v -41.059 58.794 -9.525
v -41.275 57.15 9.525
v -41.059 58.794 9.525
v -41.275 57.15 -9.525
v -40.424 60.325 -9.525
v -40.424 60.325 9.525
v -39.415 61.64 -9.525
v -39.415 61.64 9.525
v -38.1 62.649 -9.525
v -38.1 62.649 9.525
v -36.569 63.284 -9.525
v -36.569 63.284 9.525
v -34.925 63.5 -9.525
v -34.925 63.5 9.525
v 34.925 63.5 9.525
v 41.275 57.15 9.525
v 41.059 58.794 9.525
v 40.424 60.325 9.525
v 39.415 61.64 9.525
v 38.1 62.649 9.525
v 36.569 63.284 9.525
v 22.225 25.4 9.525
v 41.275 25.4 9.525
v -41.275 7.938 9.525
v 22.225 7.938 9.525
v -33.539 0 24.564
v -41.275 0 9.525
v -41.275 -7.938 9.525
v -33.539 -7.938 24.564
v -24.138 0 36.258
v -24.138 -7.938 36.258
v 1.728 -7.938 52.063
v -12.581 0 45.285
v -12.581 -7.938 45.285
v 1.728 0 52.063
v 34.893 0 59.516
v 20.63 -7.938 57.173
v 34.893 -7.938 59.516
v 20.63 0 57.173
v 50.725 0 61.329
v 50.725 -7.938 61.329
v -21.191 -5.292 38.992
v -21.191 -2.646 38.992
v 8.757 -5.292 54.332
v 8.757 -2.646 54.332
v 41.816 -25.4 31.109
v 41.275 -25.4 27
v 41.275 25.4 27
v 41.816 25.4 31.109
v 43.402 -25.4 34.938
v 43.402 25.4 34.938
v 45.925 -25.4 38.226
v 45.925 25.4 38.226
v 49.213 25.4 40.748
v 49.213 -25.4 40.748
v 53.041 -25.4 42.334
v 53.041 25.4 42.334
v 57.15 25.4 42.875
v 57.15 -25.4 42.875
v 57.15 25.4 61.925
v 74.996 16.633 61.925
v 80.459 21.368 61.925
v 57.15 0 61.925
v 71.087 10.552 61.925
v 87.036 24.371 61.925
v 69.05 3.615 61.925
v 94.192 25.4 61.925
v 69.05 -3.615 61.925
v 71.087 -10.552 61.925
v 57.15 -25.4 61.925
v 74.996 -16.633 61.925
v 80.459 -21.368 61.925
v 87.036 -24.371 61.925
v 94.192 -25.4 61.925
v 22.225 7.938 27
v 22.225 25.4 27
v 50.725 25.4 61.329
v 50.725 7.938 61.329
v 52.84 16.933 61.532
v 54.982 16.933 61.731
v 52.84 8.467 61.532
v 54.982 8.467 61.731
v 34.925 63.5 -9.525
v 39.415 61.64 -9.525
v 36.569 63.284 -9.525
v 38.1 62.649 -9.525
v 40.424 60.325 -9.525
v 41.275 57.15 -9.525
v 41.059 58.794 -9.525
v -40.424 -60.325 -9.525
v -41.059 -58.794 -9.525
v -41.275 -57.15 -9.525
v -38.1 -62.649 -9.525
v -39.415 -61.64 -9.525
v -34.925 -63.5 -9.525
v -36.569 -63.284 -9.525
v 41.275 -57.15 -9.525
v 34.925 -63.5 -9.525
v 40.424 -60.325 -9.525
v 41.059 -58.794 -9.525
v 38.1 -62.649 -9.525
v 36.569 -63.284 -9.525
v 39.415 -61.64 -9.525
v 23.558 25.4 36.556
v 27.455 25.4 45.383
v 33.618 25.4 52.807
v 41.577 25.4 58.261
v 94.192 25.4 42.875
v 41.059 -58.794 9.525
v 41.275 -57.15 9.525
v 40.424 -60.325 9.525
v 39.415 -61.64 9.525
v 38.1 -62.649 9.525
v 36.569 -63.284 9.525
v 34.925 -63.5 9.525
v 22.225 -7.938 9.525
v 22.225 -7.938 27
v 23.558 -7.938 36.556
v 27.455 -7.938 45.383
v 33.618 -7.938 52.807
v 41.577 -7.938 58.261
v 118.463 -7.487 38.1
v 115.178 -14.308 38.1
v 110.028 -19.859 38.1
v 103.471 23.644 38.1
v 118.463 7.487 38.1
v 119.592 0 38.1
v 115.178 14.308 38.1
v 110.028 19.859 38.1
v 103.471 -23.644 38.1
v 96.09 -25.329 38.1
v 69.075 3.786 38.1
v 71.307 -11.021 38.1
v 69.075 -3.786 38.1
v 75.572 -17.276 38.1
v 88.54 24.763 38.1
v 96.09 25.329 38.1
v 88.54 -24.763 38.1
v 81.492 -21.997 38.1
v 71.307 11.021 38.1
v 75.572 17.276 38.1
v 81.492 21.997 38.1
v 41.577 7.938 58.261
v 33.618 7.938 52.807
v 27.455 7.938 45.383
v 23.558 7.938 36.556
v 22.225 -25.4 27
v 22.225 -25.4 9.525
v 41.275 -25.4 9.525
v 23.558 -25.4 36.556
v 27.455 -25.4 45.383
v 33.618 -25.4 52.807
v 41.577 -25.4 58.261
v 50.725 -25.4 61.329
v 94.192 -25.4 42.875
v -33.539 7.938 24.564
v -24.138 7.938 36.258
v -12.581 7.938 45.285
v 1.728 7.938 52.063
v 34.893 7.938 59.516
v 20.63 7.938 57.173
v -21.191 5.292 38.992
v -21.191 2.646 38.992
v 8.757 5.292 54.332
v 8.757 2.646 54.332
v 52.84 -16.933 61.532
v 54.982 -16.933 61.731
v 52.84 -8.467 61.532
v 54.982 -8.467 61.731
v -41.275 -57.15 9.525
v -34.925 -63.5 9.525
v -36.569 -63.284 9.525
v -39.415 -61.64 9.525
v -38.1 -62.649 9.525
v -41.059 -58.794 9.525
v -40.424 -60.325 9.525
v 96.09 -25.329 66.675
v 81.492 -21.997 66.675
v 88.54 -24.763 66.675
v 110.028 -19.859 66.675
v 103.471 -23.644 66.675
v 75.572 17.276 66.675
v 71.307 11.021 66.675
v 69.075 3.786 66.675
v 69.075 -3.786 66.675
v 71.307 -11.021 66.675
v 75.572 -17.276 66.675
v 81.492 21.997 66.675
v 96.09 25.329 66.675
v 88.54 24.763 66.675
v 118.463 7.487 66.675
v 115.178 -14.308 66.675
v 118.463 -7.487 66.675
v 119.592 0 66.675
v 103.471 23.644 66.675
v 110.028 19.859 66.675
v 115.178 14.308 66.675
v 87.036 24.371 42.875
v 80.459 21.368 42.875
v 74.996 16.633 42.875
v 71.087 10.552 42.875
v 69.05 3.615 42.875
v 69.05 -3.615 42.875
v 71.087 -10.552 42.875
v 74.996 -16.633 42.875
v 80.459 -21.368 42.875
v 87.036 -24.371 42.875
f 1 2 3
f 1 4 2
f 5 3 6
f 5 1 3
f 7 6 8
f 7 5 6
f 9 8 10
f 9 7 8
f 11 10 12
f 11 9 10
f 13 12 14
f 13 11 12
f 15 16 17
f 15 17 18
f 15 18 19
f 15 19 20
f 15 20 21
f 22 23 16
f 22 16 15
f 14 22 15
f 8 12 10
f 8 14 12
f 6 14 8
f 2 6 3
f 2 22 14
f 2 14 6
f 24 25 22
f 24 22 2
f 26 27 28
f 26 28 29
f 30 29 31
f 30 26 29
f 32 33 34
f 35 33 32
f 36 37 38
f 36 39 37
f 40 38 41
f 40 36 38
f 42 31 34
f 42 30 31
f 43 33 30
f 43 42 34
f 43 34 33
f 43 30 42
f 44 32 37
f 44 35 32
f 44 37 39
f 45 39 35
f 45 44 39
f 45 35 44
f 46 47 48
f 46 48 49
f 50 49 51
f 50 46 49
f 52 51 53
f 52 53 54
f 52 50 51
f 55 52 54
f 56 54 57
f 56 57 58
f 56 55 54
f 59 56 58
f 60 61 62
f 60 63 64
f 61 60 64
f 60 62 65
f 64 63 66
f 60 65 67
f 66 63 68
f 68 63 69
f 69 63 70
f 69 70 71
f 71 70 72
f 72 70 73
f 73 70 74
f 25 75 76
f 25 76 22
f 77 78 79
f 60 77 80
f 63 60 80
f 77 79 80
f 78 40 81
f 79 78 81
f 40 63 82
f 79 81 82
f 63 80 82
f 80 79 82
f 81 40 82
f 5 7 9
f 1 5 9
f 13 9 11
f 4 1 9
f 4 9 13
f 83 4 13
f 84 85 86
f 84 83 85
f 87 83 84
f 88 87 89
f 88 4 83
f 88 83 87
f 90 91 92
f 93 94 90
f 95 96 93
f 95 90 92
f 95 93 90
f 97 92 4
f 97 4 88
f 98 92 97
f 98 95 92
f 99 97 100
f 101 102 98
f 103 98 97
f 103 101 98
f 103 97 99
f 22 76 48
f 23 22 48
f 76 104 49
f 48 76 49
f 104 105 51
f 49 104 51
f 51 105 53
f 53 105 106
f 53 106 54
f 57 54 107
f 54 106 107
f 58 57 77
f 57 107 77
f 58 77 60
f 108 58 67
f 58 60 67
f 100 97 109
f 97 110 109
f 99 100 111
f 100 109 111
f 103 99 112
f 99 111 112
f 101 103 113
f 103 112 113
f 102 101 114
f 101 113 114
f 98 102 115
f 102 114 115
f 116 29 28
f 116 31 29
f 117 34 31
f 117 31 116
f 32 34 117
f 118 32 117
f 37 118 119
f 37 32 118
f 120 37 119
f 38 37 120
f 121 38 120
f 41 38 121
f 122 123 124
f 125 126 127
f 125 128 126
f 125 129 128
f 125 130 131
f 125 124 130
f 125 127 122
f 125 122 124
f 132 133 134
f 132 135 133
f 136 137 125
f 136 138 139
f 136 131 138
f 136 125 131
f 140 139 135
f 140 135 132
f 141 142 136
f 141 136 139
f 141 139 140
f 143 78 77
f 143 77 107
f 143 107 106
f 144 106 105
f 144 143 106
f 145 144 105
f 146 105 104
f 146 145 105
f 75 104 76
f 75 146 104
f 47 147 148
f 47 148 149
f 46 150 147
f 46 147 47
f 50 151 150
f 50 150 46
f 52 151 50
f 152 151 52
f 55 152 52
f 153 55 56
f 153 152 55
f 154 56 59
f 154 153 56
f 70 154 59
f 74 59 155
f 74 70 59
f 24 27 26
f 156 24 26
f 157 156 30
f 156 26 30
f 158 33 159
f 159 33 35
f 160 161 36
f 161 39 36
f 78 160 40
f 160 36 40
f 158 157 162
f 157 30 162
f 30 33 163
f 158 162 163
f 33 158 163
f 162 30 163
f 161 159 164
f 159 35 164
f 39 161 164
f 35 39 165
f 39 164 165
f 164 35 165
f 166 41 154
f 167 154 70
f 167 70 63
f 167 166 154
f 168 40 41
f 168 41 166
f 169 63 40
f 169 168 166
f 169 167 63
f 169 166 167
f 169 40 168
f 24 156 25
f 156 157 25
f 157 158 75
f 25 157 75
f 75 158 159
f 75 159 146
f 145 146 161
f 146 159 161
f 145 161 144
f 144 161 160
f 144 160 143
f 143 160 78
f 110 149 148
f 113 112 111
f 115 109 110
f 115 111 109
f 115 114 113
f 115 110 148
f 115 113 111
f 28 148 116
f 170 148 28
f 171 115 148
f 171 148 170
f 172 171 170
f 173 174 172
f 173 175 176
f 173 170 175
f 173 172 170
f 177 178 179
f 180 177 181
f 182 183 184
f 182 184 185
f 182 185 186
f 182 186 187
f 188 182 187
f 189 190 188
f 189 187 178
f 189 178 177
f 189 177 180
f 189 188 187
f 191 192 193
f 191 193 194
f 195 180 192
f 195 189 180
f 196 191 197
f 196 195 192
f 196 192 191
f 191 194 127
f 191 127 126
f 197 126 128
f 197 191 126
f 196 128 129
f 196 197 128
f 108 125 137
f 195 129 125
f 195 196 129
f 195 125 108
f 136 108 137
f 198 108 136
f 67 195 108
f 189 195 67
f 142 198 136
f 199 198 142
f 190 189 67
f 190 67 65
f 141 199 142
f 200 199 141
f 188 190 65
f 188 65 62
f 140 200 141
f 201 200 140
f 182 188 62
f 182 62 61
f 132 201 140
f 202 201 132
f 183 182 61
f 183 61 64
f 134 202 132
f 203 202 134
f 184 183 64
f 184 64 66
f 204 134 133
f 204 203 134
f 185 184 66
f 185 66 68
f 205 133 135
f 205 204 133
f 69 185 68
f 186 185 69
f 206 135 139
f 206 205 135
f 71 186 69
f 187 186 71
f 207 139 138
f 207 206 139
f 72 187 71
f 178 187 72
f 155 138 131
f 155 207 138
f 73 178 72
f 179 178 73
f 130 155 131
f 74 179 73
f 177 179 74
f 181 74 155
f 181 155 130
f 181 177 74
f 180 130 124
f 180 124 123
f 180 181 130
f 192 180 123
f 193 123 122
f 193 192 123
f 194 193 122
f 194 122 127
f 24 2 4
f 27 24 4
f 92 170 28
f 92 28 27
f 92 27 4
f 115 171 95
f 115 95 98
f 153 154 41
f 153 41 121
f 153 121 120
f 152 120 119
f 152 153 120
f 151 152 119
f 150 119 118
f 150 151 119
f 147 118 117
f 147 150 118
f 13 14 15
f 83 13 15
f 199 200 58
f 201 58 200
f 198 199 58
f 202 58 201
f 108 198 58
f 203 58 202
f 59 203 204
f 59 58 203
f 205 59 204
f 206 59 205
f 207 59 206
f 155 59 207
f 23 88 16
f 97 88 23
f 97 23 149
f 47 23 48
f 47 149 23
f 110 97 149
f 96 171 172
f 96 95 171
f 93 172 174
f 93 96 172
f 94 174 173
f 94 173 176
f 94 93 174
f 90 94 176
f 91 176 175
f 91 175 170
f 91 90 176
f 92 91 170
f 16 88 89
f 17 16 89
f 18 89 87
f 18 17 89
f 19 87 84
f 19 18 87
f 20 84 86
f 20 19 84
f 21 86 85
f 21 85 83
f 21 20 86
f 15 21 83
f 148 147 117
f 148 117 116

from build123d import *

# Parameters (mm, degrees)
F1_DEPTH = 63.5
F2_DEPTH = 25.4
F3_DEPTH = 7.9375
F0_W     = 25.4
F0_H     = 19.05
F4_DEPTH = 25.4
F6_R     = 6.35


# Not quite as in the source:
# - ends of sketch curves that miss each other by under 0.0002 mm in the source are joined
# - a feature names something its author has since deleted; it is built from what else it names


with BuildPart() as f1:
    # F0 (on Front) → F1 (new body, symmetric)
    with BuildSketch(Plane.XZ):
        Polygon((41.275, -9.525), (41.275, 9.525), (22.225, 9.525), (-41.275, 9.525), (-41.275, -9.525), align=None)
    extrude(amount=F1_DEPTH, both=True)

    # F0 (on Front) → F2 (join, symmetric)
    with BuildSketch(Plane.XZ):
        with BuildLine():
            Line((22.225, 9.525), (41.275, 9.525))
            Line((41.275, 9.525), (41.275, 27.0002))
            ThreePointArc((41.275, 27.0002), (45.9246798487, 38.2255201513), (57.15, 42.8752))
            Line((57.15, 42.8752), (68.7916731741, 42.8752))
            Line((68.7916731741, 42.8752), (68.7916731741, 61.9252))
            Line((68.7916731741, 61.9252), (57.15, 61.9252))
            add(Edge.make_bspline(
                [(50.7252492869, 61.329171511), (52.8269652502, 61.534305037), (54.9682888804, 61.732284225), (57.15, 61.9252)],
                knots=[106.8911851376, 106.8911851376, 106.8911851376, 106.8911851376, 111.5045367133, 111.5045367133, 111.5045367133, 111.5045367133], degree=3))
            ThreePointArc((50.7252492869, 61.329171511), (30.2786385449, 49.3090690945), (22.22499883, 27.0002))
            Line((22.22499883, 27.0002), (22.225, 9.525))
        make_face()
    extrude(amount=F2_DEPTH, both=True)

    # F0 (on Front) → F3 (join, symmetric)
    with BuildSketch(Plane.XZ):
        with BuildLine():
            Line((-41.275, 9.525), (22.225, 9.525))
            Line((22.225, 9.525), (22.225, 27.0002))
            ThreePointArc((22.225, 27.0002), (30.2786385449, 49.3090690945), (50.7252492869, 61.329171511))
            add(Edge.make_bspline(
                [(-41.275, 9.525), (-25.4048483065, 47.9825129098), (2.0285682627, 56.5762353117), (50.7252492869, 61.329171511)],
                knots=[0, 0, 0, 0, 106.8911851376, 106.8911851376, 106.8911851376, 106.8911851376], degree=3))
        make_face()
    extrude(amount=F3_DEPTH, both=True)

    # F0 (on Front) → F4 (join, symmetric)
    with BuildSketch(Plane.XZ):
        with Locations((81.4916731741, 52.4002)):
            Rectangle(F0_W, F0_H)
    extrude(amount=F4_DEPTH, both=True)

    # F0 (on Front) → F5 (revolve)
    with BuildSketch(Plane.XZ):
        Polygon((94.1916731741, 61.9252), (94.1916731741, 42.8752), (94.1916731741, 38.1), (119.5916731741, 38.1), (119.5916731741, 66.675), (94.1916731741, 66.675), align=None)
    revolve(axis=Axis((94.1916731741, 0, 52.3875), (0, 0, 1)))

    # F6
    f6_edges = [f1.edges().sort_by_distance(p)[0] for p in [
        (41.275, -63.5, 0),
        (-41.275, -63.5, 0),
        (41.275, 63.5, 0),
        (-41.275, 63.5, 0),
    ]]
    fillet(f6_edges, radius=F6_R)


solid = f1.part
